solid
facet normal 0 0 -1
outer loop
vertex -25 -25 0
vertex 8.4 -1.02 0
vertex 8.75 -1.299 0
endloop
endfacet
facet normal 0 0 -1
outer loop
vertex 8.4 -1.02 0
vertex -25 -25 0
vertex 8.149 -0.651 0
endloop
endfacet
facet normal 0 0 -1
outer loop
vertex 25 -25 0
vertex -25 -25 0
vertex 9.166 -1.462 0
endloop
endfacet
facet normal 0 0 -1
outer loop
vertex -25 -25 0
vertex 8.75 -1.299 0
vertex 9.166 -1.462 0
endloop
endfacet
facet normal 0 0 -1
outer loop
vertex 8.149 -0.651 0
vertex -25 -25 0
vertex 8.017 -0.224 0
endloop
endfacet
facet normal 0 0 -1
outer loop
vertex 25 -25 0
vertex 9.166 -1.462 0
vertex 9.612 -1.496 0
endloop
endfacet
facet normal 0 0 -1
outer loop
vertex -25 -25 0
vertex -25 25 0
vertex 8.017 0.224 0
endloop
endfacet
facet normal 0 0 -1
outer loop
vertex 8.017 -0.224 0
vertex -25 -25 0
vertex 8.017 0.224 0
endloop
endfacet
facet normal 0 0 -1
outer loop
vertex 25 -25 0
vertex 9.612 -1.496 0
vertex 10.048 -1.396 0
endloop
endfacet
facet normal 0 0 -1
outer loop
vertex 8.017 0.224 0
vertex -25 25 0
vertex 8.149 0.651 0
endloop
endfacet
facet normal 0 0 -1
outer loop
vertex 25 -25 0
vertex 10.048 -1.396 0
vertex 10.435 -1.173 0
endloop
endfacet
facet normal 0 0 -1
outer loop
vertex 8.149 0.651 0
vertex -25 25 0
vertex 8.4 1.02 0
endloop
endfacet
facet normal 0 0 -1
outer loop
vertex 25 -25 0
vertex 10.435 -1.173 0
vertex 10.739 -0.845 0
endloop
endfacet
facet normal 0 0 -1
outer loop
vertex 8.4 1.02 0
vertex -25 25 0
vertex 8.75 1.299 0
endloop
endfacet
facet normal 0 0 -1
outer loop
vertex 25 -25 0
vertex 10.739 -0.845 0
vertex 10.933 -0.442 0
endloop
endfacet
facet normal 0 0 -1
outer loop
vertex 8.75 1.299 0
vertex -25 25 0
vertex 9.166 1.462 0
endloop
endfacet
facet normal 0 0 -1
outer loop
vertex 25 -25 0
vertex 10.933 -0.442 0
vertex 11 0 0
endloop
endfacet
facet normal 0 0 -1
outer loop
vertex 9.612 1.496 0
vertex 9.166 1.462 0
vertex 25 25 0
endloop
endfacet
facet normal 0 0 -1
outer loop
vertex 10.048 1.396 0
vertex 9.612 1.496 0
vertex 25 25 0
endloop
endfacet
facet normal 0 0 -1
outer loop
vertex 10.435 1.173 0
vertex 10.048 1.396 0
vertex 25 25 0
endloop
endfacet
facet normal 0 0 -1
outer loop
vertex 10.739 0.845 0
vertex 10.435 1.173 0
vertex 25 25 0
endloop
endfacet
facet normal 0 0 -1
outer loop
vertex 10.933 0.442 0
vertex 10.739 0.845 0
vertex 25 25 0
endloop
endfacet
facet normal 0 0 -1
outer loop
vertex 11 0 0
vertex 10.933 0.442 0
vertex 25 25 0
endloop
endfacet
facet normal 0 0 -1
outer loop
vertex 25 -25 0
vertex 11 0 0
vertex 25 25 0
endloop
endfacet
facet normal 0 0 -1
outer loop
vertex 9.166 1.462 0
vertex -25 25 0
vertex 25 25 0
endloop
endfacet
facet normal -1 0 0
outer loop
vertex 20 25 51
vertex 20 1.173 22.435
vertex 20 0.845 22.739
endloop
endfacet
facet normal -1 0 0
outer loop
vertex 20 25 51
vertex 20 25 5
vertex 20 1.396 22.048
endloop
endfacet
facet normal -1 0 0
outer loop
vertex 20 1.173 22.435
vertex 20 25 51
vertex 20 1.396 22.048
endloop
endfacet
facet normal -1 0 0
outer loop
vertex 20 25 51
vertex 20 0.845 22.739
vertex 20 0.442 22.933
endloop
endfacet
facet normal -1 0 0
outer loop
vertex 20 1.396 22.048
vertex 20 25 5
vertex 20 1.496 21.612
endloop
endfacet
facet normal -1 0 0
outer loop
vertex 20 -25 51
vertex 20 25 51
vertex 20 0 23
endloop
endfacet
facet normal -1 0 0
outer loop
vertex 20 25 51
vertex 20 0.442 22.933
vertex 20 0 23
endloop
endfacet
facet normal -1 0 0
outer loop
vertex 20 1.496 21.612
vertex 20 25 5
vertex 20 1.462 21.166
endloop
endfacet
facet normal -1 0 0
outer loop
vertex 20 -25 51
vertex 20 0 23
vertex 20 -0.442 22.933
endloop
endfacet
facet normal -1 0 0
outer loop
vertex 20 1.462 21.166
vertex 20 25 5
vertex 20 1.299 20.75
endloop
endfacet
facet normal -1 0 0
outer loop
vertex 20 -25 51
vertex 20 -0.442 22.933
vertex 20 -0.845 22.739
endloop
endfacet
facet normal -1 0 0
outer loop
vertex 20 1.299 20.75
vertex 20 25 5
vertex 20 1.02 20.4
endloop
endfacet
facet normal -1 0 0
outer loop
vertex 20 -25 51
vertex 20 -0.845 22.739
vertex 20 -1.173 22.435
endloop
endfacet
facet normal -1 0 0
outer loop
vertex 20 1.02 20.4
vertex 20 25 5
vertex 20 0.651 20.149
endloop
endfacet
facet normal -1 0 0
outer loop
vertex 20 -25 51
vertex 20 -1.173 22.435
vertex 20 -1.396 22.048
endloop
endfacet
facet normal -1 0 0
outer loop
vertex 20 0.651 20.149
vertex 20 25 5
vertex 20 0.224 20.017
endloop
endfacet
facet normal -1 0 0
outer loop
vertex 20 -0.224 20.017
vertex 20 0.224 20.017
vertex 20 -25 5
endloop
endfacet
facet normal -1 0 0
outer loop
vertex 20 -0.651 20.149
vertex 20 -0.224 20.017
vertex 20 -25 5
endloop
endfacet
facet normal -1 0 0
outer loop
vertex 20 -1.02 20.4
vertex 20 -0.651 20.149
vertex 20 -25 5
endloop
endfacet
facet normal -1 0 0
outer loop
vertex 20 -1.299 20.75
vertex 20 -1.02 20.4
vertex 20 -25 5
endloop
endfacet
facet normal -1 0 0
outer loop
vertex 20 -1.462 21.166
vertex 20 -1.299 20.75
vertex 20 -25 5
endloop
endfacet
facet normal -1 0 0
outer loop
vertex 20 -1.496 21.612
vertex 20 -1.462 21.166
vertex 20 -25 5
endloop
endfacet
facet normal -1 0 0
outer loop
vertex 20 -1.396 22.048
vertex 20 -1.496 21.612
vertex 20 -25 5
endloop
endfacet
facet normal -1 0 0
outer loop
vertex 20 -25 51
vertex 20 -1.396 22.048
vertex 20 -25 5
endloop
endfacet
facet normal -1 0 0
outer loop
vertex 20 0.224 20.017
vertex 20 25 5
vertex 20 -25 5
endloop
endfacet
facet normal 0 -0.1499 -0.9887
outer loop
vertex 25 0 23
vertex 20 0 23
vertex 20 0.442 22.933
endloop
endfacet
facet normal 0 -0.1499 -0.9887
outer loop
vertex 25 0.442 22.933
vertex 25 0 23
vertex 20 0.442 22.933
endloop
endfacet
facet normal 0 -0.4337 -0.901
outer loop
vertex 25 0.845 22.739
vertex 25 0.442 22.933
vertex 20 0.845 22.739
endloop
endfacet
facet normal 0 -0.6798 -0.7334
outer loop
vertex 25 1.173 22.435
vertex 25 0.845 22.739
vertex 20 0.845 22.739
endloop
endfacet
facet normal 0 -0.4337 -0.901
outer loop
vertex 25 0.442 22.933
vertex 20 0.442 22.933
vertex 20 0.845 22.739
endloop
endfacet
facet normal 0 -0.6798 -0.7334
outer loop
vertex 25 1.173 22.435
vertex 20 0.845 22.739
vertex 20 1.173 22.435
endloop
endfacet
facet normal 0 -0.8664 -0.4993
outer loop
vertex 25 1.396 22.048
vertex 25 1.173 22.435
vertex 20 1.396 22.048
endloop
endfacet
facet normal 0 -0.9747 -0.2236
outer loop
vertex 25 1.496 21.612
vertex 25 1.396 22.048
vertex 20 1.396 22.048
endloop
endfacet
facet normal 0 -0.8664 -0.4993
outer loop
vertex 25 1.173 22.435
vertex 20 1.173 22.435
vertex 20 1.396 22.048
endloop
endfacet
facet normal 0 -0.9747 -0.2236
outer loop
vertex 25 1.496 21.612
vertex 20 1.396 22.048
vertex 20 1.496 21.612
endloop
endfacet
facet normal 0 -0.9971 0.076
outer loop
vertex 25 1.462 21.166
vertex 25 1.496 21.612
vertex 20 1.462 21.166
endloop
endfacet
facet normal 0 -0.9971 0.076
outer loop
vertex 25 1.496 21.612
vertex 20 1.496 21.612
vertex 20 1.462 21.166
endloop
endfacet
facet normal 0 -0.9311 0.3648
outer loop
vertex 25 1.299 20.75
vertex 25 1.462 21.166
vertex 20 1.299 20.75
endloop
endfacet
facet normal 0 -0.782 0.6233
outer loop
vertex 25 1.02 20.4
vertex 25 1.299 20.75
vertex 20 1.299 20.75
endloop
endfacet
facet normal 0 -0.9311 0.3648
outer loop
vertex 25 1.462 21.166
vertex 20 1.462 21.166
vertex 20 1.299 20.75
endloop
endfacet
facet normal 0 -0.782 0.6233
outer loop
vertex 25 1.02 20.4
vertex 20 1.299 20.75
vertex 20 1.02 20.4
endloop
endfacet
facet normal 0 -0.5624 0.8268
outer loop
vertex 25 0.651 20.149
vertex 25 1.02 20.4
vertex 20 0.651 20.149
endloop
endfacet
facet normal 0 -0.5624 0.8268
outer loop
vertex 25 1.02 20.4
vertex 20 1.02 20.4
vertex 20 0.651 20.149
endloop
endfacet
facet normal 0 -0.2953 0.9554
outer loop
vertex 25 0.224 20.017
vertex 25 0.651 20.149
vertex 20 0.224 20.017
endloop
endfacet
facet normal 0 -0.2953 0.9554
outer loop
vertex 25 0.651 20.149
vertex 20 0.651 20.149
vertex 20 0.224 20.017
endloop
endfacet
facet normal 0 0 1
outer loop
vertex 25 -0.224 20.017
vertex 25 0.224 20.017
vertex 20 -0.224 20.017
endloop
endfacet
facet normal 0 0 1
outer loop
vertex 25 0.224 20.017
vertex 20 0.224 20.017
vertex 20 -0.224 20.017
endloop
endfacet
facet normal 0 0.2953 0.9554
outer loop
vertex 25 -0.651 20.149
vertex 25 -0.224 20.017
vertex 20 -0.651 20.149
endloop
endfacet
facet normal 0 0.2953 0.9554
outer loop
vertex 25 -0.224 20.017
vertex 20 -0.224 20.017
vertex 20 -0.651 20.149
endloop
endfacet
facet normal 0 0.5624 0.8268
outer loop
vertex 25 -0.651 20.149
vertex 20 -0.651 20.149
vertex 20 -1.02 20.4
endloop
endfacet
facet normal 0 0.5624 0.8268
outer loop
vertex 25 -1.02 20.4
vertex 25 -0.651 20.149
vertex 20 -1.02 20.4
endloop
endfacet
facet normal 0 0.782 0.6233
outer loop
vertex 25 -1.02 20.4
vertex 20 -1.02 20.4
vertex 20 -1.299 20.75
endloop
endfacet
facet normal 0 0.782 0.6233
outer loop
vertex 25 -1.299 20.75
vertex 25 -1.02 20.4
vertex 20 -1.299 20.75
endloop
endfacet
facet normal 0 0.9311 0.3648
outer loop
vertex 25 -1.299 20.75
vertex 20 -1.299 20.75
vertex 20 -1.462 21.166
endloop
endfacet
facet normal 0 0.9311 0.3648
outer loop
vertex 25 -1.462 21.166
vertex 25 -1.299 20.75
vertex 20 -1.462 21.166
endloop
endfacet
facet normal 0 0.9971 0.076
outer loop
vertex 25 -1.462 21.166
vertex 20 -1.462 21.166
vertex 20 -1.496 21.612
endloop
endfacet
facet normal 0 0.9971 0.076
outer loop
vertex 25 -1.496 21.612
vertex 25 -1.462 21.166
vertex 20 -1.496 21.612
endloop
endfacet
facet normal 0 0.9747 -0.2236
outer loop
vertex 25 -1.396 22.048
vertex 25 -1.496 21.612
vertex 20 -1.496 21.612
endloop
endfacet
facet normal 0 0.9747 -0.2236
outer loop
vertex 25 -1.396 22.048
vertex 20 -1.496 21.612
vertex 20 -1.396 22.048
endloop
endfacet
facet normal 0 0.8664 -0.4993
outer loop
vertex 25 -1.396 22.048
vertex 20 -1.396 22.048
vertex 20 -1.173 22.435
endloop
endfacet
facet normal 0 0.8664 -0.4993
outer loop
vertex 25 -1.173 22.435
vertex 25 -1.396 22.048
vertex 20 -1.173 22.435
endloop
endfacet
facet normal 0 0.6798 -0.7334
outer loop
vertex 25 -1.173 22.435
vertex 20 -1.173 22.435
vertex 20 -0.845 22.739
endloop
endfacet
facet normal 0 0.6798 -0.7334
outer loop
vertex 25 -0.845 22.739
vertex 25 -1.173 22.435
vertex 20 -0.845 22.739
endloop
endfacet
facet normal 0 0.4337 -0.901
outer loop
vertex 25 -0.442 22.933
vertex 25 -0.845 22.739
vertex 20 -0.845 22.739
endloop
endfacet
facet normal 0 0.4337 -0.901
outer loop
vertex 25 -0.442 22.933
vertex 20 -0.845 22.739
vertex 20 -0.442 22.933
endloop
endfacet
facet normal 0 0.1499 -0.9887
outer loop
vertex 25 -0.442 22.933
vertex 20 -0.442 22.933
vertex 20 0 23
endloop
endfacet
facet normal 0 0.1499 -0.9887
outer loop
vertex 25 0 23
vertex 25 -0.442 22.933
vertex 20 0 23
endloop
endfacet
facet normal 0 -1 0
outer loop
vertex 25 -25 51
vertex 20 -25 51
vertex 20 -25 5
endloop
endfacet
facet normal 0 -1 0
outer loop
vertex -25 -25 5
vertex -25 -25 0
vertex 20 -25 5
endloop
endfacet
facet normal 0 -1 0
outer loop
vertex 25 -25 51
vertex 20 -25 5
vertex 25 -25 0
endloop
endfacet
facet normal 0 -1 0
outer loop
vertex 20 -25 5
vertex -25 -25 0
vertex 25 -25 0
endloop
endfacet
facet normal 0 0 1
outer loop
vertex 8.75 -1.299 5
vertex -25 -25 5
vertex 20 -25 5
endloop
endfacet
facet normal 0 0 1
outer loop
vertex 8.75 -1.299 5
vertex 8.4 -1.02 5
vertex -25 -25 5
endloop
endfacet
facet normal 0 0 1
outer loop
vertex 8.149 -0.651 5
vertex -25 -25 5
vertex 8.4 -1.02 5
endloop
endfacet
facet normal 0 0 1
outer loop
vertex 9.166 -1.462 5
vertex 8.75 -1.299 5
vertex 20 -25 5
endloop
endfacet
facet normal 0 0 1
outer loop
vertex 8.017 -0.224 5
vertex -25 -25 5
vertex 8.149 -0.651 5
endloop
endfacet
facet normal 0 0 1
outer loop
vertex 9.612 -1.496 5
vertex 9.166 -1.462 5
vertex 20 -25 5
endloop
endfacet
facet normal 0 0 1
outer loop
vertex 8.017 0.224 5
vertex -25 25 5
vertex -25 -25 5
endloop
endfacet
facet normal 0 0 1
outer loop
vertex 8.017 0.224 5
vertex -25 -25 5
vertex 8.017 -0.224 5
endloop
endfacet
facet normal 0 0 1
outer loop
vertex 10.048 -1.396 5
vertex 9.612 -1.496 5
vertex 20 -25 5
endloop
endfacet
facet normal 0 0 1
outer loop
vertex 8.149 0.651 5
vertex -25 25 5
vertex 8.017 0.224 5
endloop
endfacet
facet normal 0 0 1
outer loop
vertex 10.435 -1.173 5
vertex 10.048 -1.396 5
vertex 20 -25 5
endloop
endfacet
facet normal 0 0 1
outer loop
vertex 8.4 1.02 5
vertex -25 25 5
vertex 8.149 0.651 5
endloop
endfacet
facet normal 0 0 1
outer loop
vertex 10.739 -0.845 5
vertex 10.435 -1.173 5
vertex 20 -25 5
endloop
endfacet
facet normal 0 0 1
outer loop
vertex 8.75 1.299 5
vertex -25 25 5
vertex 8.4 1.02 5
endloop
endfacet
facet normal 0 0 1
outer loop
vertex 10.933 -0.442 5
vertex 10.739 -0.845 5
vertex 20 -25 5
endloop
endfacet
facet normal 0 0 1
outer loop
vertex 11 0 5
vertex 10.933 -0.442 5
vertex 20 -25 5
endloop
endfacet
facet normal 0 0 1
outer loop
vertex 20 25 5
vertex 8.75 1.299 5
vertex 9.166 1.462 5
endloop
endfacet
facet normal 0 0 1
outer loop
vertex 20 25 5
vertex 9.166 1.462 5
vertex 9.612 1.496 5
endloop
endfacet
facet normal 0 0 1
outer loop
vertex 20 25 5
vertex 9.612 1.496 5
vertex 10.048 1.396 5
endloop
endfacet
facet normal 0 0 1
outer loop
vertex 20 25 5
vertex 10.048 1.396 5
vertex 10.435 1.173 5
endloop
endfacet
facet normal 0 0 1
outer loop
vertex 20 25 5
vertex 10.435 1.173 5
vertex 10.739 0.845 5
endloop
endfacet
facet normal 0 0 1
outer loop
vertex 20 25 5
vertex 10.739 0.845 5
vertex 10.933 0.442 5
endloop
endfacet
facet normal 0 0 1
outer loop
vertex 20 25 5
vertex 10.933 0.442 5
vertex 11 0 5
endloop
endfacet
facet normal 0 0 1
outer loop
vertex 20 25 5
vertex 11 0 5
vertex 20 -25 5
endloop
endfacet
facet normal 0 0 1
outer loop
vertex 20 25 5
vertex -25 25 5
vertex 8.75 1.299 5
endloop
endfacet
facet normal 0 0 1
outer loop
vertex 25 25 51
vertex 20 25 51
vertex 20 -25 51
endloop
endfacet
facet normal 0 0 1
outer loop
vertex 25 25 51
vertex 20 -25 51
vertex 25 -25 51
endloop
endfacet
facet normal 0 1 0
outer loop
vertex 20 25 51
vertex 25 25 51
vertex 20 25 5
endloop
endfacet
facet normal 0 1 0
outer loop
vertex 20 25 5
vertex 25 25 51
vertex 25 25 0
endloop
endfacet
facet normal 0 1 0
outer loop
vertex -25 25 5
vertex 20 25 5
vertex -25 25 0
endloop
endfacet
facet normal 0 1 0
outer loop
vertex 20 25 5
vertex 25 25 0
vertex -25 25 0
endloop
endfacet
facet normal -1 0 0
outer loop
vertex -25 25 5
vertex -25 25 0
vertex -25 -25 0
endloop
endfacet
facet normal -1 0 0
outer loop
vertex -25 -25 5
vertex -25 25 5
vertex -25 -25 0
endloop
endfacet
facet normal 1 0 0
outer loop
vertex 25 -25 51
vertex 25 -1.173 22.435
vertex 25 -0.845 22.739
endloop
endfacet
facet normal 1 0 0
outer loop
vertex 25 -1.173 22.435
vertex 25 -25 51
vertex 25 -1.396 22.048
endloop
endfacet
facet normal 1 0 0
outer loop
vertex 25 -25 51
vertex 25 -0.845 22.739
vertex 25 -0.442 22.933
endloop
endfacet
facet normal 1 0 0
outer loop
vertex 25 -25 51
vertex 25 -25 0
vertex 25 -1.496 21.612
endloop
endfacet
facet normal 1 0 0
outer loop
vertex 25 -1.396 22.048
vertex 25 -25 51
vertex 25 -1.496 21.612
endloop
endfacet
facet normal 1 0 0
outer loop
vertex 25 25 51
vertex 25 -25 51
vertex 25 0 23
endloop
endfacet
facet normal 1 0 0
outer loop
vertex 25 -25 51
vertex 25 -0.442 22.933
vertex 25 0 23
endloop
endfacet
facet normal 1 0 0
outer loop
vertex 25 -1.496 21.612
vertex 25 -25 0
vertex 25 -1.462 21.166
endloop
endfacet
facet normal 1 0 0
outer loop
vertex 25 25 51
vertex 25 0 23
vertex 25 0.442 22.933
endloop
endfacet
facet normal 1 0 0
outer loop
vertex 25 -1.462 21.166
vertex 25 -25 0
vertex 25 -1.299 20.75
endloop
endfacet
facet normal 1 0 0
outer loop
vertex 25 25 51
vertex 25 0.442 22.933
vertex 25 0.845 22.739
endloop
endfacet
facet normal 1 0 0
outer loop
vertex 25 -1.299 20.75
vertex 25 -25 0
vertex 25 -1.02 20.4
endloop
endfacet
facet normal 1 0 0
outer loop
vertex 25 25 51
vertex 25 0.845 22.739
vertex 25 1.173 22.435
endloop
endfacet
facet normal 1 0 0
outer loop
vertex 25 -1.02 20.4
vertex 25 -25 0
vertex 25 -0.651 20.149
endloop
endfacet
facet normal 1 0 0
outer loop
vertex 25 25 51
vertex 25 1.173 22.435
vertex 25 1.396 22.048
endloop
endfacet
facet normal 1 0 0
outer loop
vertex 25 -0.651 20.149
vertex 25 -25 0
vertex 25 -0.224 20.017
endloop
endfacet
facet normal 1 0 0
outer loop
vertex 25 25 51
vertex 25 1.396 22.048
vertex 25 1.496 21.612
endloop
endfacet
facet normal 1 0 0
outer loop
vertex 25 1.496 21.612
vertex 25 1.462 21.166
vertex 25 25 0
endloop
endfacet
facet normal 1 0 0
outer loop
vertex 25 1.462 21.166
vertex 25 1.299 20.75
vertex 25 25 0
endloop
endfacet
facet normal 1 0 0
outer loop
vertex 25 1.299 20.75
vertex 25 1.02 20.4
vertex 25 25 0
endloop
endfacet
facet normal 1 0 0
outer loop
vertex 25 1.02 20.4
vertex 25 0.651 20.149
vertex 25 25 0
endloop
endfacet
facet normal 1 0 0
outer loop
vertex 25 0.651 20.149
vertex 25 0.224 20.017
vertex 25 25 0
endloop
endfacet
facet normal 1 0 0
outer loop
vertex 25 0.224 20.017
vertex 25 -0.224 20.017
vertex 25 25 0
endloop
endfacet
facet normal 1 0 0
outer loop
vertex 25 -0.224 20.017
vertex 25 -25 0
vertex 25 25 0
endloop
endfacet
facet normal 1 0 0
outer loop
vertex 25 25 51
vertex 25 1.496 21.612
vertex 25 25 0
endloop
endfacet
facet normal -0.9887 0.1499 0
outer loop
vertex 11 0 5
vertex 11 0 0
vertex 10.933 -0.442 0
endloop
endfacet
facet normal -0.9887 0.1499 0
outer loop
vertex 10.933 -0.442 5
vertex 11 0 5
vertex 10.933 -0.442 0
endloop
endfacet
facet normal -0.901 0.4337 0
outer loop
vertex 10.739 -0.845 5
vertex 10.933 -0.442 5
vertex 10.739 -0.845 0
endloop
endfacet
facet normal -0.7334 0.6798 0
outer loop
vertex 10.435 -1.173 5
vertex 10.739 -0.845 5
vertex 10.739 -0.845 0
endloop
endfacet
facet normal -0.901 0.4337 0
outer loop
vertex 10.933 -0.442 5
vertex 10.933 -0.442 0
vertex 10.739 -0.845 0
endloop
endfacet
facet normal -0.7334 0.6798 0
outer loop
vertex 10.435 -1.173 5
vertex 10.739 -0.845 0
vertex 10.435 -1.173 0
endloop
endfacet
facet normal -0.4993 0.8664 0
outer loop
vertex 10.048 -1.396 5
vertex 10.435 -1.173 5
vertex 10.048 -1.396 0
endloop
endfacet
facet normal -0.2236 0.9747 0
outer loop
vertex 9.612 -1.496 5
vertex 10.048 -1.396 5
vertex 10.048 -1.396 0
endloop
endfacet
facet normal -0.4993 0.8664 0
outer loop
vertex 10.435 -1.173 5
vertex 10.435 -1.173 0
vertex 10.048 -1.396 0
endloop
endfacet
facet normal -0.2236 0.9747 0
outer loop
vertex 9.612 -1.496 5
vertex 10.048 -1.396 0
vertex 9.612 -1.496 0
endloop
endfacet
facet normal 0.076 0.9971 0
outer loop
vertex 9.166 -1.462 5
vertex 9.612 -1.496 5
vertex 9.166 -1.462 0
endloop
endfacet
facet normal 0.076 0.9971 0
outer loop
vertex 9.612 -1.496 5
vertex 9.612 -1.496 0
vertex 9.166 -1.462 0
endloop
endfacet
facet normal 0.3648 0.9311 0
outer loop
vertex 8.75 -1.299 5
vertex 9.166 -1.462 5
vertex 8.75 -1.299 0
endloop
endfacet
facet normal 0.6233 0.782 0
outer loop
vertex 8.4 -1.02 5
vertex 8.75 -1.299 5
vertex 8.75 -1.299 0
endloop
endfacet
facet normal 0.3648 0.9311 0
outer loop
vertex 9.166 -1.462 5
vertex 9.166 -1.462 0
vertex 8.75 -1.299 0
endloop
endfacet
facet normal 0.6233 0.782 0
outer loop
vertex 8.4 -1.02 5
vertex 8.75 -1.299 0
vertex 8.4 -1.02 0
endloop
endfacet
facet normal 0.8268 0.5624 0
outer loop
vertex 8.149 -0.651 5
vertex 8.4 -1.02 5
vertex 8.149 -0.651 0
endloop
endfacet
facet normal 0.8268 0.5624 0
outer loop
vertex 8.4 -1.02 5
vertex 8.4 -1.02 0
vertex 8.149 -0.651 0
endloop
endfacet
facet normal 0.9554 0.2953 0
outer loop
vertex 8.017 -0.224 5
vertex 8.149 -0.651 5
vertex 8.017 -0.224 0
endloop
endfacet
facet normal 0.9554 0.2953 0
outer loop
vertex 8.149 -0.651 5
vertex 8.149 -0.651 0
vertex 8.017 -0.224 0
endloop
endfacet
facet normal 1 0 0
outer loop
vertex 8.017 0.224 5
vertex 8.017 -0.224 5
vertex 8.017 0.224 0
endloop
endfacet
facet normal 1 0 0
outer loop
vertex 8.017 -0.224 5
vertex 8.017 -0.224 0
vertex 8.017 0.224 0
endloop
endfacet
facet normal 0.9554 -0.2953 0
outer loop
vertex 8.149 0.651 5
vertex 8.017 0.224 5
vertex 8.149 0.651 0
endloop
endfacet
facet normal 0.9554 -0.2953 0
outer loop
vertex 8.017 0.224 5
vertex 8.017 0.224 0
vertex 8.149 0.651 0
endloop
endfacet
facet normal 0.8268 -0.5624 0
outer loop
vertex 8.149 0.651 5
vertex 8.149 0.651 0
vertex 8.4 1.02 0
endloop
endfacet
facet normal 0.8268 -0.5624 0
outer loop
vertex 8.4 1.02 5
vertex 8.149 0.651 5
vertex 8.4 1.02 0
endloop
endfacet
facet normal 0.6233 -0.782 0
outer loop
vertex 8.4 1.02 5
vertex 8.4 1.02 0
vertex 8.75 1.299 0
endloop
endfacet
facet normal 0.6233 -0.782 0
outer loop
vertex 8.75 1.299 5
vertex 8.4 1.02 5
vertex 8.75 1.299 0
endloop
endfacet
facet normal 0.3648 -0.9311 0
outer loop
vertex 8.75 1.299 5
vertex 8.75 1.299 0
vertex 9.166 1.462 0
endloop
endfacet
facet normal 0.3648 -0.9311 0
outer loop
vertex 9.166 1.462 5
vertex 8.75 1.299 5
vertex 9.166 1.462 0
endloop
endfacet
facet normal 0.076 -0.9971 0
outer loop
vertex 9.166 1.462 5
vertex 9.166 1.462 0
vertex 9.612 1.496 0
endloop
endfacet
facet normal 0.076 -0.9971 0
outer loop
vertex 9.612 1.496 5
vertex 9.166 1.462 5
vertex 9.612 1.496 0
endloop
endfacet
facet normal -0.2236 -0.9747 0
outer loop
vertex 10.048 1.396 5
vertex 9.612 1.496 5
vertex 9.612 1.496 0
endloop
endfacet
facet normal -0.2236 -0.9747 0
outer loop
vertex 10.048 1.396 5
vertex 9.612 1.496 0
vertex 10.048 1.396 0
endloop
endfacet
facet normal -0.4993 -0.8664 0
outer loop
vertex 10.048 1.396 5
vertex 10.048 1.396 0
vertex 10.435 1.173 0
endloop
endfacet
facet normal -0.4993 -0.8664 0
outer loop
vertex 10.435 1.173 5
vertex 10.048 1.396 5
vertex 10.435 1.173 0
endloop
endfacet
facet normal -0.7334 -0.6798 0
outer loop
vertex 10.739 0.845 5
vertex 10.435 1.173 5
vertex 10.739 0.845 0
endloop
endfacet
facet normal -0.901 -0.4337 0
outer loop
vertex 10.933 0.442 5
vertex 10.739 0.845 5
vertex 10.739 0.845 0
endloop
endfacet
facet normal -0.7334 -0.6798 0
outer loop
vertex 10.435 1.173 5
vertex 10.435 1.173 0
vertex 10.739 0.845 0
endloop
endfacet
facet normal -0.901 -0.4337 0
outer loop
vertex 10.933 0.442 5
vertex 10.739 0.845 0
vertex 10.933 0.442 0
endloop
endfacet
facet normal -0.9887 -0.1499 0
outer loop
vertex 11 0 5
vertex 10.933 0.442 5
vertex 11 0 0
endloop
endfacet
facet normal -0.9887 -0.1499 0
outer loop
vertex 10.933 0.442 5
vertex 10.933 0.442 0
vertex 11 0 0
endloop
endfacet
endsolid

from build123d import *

# Parameters (mm, degrees)
EXTRUDE_1_DEPTH     = 5
EXTRUDE_2_DEPTH     = 51
SKETCH_2_R          = 1.5
CUT_EXTRUDE_1_DEPTH = 10


with BuildPart() as part:
    # ｽｹｯﾁ1 → ﾎﾞｽ - 押し出し1 (new body)
    with BuildSketch(Plane.XY):
        Polygon((20, -25), (20, 0), (20, 25), (-25, 25), (-25, -25), align=None)
        with BuildLine():
            ThreePointArc((8, 0), (9.5, 1.5), (11, 0))
            ThreePointArc((11, 0), (9.5, -1.5), (8, 0))
        make_face(mode=Mode.SUBTRACT)
    extrude(amount=EXTRUDE_1_DEPTH)

    # ｽｹｯﾁ1<4> → ﾎﾞｽ - 押し出し2 (add)
    with BuildSketch(Plane.XY):
        Polygon((20, 25), (20, 0), (20, -25), (25, -25), (25, 25), align=None)
    extrude(amount=EXTRUDE_2_DEPTH)

    # ｽｹｯﾁ2 → ｶｯﾄ - 押し出し1 (cut)
    with BuildSketch(Plane.ZY.offset(-20)):
        with Locations((21.5, 0)):
            Circle(SKETCH_2_R)
    extrude(amount=-CUT_EXTRUDE_1_DEPTH, mode=Mode.SUBTRACT)


solid = part.part
